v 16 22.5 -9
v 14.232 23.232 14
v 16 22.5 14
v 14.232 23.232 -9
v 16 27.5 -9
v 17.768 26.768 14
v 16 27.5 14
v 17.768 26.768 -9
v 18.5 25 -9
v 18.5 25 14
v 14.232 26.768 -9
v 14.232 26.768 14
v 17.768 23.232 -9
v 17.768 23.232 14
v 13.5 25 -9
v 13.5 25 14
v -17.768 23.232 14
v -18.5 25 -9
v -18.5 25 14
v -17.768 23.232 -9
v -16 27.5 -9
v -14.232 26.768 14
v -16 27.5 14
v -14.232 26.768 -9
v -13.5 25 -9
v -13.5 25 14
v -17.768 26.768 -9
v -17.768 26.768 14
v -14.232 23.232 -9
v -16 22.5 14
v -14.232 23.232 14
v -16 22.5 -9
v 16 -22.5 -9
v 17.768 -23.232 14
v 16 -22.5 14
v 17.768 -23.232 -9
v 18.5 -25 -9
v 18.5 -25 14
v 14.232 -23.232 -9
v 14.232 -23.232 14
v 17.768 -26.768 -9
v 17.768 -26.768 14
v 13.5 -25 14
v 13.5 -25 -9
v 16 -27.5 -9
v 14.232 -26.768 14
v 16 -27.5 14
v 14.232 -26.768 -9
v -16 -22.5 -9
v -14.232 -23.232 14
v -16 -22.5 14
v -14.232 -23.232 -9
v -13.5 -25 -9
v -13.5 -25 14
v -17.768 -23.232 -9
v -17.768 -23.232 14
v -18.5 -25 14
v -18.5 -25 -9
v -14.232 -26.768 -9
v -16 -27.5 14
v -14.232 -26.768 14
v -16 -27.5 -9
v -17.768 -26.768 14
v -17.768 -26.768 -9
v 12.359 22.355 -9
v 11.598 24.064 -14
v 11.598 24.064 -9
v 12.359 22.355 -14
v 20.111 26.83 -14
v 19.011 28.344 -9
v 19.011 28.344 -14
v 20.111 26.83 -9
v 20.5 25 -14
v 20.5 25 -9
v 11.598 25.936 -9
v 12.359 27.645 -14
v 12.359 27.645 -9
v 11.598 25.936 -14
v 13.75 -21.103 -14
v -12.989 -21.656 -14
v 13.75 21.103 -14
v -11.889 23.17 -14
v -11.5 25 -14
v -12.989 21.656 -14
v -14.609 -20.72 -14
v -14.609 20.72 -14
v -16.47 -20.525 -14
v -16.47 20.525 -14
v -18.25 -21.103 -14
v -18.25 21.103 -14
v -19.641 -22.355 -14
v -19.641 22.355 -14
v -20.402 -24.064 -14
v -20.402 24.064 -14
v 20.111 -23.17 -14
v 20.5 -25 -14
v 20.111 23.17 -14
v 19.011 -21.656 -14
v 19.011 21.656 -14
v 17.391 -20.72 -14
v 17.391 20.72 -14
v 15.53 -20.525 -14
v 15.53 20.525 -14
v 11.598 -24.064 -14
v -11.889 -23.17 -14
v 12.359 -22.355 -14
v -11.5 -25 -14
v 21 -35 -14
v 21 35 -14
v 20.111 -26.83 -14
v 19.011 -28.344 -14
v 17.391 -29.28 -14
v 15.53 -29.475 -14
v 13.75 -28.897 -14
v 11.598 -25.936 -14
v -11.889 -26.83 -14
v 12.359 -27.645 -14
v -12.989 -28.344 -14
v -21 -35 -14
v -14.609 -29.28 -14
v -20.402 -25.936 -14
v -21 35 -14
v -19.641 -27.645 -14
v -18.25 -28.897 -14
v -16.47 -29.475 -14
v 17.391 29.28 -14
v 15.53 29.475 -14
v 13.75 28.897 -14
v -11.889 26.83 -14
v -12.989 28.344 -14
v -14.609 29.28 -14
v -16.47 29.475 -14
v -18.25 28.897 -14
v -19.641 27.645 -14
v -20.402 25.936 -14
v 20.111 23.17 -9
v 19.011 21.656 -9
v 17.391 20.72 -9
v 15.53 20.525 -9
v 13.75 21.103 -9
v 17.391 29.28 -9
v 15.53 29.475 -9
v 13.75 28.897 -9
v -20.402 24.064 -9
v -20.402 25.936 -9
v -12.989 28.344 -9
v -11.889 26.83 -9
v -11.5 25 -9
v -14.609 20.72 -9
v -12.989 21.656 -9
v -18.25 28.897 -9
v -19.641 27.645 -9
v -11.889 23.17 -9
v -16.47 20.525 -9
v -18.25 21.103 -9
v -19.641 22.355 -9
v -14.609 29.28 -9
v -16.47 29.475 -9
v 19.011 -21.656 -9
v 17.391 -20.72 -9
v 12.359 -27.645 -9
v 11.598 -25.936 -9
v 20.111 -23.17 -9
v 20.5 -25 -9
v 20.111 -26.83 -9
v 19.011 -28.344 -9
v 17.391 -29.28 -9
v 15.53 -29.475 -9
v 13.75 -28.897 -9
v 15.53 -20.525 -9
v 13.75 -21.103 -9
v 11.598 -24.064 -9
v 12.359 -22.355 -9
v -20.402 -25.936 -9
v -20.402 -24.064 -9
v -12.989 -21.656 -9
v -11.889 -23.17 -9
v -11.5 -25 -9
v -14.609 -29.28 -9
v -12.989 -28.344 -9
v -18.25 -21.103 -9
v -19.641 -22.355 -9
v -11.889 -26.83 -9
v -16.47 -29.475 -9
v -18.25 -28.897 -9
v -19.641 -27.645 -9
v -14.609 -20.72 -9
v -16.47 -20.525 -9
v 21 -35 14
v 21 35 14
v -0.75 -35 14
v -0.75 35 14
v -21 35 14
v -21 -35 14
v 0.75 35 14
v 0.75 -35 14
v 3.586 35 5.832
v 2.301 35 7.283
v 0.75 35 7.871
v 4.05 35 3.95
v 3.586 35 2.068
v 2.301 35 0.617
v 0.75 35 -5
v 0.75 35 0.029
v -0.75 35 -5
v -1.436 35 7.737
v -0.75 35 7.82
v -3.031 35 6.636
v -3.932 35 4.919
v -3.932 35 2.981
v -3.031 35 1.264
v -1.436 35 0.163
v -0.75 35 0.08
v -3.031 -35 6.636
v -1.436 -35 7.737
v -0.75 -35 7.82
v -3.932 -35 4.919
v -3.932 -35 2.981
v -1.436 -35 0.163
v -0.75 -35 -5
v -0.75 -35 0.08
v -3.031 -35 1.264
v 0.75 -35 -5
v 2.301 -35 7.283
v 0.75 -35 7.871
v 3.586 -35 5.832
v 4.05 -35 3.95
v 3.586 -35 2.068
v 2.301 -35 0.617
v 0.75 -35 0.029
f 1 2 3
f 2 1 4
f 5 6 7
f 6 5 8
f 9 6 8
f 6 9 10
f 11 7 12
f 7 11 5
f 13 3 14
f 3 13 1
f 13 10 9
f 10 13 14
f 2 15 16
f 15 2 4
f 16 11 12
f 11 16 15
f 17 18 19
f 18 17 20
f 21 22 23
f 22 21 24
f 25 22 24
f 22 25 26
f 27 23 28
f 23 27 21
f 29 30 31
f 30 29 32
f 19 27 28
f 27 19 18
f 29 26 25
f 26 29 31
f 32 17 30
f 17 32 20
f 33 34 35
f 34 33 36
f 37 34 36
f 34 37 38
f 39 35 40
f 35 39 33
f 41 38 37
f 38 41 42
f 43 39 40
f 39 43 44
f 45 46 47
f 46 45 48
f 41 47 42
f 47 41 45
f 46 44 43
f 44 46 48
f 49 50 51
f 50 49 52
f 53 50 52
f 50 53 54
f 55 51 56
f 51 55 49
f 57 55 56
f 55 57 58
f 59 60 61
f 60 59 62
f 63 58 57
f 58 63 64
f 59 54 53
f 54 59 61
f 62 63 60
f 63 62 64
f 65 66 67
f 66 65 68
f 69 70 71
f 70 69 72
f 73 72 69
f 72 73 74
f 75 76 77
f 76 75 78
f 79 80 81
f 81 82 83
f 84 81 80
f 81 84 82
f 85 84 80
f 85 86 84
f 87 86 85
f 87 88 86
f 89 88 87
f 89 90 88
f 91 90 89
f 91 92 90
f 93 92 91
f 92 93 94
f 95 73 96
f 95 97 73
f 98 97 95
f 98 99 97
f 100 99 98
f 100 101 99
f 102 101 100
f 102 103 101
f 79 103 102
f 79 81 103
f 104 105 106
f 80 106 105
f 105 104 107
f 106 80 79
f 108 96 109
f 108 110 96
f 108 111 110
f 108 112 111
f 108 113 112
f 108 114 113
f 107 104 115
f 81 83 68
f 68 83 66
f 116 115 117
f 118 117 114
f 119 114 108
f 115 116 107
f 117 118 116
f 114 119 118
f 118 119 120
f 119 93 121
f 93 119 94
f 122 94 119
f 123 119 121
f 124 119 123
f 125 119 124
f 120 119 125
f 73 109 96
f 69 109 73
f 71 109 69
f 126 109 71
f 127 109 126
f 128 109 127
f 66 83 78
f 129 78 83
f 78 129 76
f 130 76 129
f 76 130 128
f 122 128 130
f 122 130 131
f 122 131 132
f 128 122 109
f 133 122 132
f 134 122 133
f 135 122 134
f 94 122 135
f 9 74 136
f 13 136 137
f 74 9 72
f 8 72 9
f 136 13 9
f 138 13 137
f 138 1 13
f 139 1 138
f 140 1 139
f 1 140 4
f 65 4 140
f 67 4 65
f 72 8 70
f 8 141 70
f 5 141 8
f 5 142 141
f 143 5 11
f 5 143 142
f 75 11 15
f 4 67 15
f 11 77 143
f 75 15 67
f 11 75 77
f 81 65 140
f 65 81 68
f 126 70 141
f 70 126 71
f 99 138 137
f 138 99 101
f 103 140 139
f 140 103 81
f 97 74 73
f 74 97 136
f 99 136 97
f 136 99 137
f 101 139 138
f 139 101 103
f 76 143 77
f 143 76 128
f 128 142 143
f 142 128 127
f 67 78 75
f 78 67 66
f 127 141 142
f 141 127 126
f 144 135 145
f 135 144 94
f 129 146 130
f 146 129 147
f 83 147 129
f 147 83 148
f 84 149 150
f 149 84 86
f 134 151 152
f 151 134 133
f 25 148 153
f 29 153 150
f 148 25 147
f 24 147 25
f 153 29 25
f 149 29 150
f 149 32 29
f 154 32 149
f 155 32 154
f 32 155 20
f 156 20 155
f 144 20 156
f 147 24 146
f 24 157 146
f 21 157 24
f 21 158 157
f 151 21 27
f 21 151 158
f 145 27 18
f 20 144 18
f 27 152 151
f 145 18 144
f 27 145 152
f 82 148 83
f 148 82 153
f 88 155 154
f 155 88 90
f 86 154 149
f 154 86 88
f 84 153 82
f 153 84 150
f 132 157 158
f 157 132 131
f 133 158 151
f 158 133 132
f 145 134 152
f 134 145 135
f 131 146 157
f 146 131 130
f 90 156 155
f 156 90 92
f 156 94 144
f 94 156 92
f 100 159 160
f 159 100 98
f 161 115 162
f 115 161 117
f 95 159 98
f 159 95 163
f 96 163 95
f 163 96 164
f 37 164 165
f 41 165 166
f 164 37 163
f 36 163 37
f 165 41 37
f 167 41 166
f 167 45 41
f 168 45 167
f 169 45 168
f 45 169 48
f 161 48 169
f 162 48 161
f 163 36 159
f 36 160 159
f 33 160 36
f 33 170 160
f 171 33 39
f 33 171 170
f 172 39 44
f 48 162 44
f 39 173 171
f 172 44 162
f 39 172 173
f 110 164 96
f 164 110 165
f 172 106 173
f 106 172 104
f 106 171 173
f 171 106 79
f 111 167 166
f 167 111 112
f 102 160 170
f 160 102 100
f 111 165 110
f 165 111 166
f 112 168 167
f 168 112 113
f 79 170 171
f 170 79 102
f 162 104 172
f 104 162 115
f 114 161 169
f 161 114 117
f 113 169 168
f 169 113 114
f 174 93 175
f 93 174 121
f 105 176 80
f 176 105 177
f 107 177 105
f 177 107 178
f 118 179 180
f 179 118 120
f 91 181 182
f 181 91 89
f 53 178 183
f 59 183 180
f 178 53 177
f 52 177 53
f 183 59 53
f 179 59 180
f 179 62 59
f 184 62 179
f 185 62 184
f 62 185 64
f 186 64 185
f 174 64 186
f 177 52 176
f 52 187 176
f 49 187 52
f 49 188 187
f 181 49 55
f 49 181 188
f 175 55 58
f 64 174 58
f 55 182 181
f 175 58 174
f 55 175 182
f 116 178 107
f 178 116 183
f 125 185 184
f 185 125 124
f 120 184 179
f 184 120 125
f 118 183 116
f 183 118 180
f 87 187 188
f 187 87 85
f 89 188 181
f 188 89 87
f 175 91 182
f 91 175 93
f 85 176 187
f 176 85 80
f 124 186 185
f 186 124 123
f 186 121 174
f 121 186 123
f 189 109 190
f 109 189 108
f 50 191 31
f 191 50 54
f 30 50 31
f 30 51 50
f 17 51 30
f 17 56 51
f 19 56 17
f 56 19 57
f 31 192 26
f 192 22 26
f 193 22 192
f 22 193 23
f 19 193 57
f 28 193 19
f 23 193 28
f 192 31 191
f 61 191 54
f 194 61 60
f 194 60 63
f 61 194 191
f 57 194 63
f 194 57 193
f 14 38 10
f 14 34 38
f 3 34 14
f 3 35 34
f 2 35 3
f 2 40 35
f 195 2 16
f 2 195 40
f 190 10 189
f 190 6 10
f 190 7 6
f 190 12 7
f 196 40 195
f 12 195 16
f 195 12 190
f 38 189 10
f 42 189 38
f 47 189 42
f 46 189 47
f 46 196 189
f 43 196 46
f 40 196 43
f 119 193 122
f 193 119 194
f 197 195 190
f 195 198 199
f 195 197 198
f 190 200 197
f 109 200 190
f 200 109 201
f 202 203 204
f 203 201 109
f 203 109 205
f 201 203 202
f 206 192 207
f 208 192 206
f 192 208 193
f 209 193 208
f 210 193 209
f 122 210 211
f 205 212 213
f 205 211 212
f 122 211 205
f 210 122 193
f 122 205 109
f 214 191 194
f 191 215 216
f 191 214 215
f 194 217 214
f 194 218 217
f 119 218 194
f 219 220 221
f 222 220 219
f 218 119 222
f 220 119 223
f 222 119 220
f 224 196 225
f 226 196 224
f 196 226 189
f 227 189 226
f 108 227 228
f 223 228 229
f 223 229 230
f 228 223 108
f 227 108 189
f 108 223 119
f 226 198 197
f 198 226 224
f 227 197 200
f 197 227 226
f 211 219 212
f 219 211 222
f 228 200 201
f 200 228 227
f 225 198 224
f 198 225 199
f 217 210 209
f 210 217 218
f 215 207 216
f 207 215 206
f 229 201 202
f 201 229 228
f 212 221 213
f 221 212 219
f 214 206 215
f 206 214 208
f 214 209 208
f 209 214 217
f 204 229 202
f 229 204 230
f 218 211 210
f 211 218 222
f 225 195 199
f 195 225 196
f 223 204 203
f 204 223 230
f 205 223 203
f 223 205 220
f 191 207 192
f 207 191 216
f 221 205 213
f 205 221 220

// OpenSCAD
// Parameters
shaft_diameter = 8.0; //[4.0:16.0:0.1]
block_width = 42.0; //[21.0:84.0:0.5]
block_length = 70.0; //[35.0:140.0:0.5]
block_height = 28.0; //[14.0:56.0:0.5]
shaft_bore_clearance = 0.1; //[0.0:0.5:0.05]
mount_hole_diameter = 5.0; //[3.0:8.0:0.1]
mount_hole_edge_margin = 5.0; //[2.5:10.0:0.5]
mount_hole_spacing_x = 32.0; //[16.0:64.0:0.5]
mount_hole_spacing_y = 50.0; //[25.0:100.0:0.5]
counterbore_diameter = 9.0; //[6.0:14.0:0.1]
counterbore_depth = 4.0; //[1.0:10.0:0.1]
clamp_slit_width = 1.5; //[0.5:3.0:0.1]
clamp_slit_depth = 18.0; //[8.0:30.0:0.5]
bore_to_top_min_wall = 6.0; //[3.0:12.0:0.5]
overlap = 1.0; //[0.5:2.0:0.1]
bearing_outer_diameter = 15.0; //[10.0:30.0:0.1]
bearing_length = 24.0; //[12.0:60.0:0.5]

// Modules
module scs_bearing_block() {
  color("Silver") {
    cube([block_width, block_length, block_height], center=true);
  }
}

module scs_bearing_block_hole_positions() {
  color("DimGray") {
    translate([mount_hole_spacing_x/2, mount_hole_spacing_y/2, 0])
      cylinder(h=block_height + 2*overlap, r=mount_hole_diameter/2, center=true);
    translate([-mount_hole_spacing_x/2, mount_hole_spacing_y/2, 0])
      cylinder(h=block_height + 2*overlap, r=mount_hole_diameter/2, center=true);
    translate([mount_hole_spacing_x/2, -mount_hole_spacing_y/2, 0])
      cylinder(h=block_height + 2*overlap, r=mount_hole_diameter/2, center=true);
    translate([-mount_hole_spacing_x/2, -mount_hole_spacing_y/2, 0])
      cylinder(h=block_height + 2*overlap, r=mount_hole_diameter/2, center=true);
  }
}

module sbr_bearing_block_hole_positions() {
  color("DimGray") {
    translate([mount_hole_spacing_x/2, mount_hole_spacing_y/2, -block_height/2 + (counterbore_depth + overlap)/2])
      cylinder(h=counterbore_depth + overlap, r=counterbore_diameter/2, center=true);
    translate([-mount_hole_spacing_x/2, mount_hole_spacing_y/2, -block_height/2 + (counterbore_depth + overlap)/2])
      cylinder(h=counterbore_depth + overlap, r=counterbore_diameter/2, center=true);
    translate([mount_hole_spacing_x/2, -mount_hole_spacing_y/2, -block_height/2 + (counterbore_depth + overlap)/2])
      cylinder(h=counterbore_depth + overlap, r=counterbore_diameter/2, center=true);
    translate([-mount_hole_spacing_x/2, -mount_hole_spacing_y/2, -block_height/2 + (counterbore_depth + overlap)/2])
      cylinder(h=counterbore_depth + overlap, r=counterbore_diameter/2, center=true);
  }
}

module scs_bearing_block_assembly() {
  color("Silver") {
    difference() {
      scs_bearing_block();
      translate([0, 0, block_height/2 - bore_to_top_min_wall - (shaft_diameter + shaft_bore_clearance)/2])
        rotate([90, 0, 0])
        cylinder(h=block_length + 2*overlap, r=(shaft_diameter + shaft_bore_clearance)/2, center=true);
      scs_bearing_block_hole_positions();
      sbr_bearing_block_hole_positions();
      translate([0, 0, block_height/2 - (clamp_slit_depth + overlap)/2])
        cube([clamp_slit_width, block_length + 2*overlap, clamp_slit_depth + overlap], center=true);
    }
  }
}

module assembly() {
  scs_bearing_block_assembly();
}

assembly();
